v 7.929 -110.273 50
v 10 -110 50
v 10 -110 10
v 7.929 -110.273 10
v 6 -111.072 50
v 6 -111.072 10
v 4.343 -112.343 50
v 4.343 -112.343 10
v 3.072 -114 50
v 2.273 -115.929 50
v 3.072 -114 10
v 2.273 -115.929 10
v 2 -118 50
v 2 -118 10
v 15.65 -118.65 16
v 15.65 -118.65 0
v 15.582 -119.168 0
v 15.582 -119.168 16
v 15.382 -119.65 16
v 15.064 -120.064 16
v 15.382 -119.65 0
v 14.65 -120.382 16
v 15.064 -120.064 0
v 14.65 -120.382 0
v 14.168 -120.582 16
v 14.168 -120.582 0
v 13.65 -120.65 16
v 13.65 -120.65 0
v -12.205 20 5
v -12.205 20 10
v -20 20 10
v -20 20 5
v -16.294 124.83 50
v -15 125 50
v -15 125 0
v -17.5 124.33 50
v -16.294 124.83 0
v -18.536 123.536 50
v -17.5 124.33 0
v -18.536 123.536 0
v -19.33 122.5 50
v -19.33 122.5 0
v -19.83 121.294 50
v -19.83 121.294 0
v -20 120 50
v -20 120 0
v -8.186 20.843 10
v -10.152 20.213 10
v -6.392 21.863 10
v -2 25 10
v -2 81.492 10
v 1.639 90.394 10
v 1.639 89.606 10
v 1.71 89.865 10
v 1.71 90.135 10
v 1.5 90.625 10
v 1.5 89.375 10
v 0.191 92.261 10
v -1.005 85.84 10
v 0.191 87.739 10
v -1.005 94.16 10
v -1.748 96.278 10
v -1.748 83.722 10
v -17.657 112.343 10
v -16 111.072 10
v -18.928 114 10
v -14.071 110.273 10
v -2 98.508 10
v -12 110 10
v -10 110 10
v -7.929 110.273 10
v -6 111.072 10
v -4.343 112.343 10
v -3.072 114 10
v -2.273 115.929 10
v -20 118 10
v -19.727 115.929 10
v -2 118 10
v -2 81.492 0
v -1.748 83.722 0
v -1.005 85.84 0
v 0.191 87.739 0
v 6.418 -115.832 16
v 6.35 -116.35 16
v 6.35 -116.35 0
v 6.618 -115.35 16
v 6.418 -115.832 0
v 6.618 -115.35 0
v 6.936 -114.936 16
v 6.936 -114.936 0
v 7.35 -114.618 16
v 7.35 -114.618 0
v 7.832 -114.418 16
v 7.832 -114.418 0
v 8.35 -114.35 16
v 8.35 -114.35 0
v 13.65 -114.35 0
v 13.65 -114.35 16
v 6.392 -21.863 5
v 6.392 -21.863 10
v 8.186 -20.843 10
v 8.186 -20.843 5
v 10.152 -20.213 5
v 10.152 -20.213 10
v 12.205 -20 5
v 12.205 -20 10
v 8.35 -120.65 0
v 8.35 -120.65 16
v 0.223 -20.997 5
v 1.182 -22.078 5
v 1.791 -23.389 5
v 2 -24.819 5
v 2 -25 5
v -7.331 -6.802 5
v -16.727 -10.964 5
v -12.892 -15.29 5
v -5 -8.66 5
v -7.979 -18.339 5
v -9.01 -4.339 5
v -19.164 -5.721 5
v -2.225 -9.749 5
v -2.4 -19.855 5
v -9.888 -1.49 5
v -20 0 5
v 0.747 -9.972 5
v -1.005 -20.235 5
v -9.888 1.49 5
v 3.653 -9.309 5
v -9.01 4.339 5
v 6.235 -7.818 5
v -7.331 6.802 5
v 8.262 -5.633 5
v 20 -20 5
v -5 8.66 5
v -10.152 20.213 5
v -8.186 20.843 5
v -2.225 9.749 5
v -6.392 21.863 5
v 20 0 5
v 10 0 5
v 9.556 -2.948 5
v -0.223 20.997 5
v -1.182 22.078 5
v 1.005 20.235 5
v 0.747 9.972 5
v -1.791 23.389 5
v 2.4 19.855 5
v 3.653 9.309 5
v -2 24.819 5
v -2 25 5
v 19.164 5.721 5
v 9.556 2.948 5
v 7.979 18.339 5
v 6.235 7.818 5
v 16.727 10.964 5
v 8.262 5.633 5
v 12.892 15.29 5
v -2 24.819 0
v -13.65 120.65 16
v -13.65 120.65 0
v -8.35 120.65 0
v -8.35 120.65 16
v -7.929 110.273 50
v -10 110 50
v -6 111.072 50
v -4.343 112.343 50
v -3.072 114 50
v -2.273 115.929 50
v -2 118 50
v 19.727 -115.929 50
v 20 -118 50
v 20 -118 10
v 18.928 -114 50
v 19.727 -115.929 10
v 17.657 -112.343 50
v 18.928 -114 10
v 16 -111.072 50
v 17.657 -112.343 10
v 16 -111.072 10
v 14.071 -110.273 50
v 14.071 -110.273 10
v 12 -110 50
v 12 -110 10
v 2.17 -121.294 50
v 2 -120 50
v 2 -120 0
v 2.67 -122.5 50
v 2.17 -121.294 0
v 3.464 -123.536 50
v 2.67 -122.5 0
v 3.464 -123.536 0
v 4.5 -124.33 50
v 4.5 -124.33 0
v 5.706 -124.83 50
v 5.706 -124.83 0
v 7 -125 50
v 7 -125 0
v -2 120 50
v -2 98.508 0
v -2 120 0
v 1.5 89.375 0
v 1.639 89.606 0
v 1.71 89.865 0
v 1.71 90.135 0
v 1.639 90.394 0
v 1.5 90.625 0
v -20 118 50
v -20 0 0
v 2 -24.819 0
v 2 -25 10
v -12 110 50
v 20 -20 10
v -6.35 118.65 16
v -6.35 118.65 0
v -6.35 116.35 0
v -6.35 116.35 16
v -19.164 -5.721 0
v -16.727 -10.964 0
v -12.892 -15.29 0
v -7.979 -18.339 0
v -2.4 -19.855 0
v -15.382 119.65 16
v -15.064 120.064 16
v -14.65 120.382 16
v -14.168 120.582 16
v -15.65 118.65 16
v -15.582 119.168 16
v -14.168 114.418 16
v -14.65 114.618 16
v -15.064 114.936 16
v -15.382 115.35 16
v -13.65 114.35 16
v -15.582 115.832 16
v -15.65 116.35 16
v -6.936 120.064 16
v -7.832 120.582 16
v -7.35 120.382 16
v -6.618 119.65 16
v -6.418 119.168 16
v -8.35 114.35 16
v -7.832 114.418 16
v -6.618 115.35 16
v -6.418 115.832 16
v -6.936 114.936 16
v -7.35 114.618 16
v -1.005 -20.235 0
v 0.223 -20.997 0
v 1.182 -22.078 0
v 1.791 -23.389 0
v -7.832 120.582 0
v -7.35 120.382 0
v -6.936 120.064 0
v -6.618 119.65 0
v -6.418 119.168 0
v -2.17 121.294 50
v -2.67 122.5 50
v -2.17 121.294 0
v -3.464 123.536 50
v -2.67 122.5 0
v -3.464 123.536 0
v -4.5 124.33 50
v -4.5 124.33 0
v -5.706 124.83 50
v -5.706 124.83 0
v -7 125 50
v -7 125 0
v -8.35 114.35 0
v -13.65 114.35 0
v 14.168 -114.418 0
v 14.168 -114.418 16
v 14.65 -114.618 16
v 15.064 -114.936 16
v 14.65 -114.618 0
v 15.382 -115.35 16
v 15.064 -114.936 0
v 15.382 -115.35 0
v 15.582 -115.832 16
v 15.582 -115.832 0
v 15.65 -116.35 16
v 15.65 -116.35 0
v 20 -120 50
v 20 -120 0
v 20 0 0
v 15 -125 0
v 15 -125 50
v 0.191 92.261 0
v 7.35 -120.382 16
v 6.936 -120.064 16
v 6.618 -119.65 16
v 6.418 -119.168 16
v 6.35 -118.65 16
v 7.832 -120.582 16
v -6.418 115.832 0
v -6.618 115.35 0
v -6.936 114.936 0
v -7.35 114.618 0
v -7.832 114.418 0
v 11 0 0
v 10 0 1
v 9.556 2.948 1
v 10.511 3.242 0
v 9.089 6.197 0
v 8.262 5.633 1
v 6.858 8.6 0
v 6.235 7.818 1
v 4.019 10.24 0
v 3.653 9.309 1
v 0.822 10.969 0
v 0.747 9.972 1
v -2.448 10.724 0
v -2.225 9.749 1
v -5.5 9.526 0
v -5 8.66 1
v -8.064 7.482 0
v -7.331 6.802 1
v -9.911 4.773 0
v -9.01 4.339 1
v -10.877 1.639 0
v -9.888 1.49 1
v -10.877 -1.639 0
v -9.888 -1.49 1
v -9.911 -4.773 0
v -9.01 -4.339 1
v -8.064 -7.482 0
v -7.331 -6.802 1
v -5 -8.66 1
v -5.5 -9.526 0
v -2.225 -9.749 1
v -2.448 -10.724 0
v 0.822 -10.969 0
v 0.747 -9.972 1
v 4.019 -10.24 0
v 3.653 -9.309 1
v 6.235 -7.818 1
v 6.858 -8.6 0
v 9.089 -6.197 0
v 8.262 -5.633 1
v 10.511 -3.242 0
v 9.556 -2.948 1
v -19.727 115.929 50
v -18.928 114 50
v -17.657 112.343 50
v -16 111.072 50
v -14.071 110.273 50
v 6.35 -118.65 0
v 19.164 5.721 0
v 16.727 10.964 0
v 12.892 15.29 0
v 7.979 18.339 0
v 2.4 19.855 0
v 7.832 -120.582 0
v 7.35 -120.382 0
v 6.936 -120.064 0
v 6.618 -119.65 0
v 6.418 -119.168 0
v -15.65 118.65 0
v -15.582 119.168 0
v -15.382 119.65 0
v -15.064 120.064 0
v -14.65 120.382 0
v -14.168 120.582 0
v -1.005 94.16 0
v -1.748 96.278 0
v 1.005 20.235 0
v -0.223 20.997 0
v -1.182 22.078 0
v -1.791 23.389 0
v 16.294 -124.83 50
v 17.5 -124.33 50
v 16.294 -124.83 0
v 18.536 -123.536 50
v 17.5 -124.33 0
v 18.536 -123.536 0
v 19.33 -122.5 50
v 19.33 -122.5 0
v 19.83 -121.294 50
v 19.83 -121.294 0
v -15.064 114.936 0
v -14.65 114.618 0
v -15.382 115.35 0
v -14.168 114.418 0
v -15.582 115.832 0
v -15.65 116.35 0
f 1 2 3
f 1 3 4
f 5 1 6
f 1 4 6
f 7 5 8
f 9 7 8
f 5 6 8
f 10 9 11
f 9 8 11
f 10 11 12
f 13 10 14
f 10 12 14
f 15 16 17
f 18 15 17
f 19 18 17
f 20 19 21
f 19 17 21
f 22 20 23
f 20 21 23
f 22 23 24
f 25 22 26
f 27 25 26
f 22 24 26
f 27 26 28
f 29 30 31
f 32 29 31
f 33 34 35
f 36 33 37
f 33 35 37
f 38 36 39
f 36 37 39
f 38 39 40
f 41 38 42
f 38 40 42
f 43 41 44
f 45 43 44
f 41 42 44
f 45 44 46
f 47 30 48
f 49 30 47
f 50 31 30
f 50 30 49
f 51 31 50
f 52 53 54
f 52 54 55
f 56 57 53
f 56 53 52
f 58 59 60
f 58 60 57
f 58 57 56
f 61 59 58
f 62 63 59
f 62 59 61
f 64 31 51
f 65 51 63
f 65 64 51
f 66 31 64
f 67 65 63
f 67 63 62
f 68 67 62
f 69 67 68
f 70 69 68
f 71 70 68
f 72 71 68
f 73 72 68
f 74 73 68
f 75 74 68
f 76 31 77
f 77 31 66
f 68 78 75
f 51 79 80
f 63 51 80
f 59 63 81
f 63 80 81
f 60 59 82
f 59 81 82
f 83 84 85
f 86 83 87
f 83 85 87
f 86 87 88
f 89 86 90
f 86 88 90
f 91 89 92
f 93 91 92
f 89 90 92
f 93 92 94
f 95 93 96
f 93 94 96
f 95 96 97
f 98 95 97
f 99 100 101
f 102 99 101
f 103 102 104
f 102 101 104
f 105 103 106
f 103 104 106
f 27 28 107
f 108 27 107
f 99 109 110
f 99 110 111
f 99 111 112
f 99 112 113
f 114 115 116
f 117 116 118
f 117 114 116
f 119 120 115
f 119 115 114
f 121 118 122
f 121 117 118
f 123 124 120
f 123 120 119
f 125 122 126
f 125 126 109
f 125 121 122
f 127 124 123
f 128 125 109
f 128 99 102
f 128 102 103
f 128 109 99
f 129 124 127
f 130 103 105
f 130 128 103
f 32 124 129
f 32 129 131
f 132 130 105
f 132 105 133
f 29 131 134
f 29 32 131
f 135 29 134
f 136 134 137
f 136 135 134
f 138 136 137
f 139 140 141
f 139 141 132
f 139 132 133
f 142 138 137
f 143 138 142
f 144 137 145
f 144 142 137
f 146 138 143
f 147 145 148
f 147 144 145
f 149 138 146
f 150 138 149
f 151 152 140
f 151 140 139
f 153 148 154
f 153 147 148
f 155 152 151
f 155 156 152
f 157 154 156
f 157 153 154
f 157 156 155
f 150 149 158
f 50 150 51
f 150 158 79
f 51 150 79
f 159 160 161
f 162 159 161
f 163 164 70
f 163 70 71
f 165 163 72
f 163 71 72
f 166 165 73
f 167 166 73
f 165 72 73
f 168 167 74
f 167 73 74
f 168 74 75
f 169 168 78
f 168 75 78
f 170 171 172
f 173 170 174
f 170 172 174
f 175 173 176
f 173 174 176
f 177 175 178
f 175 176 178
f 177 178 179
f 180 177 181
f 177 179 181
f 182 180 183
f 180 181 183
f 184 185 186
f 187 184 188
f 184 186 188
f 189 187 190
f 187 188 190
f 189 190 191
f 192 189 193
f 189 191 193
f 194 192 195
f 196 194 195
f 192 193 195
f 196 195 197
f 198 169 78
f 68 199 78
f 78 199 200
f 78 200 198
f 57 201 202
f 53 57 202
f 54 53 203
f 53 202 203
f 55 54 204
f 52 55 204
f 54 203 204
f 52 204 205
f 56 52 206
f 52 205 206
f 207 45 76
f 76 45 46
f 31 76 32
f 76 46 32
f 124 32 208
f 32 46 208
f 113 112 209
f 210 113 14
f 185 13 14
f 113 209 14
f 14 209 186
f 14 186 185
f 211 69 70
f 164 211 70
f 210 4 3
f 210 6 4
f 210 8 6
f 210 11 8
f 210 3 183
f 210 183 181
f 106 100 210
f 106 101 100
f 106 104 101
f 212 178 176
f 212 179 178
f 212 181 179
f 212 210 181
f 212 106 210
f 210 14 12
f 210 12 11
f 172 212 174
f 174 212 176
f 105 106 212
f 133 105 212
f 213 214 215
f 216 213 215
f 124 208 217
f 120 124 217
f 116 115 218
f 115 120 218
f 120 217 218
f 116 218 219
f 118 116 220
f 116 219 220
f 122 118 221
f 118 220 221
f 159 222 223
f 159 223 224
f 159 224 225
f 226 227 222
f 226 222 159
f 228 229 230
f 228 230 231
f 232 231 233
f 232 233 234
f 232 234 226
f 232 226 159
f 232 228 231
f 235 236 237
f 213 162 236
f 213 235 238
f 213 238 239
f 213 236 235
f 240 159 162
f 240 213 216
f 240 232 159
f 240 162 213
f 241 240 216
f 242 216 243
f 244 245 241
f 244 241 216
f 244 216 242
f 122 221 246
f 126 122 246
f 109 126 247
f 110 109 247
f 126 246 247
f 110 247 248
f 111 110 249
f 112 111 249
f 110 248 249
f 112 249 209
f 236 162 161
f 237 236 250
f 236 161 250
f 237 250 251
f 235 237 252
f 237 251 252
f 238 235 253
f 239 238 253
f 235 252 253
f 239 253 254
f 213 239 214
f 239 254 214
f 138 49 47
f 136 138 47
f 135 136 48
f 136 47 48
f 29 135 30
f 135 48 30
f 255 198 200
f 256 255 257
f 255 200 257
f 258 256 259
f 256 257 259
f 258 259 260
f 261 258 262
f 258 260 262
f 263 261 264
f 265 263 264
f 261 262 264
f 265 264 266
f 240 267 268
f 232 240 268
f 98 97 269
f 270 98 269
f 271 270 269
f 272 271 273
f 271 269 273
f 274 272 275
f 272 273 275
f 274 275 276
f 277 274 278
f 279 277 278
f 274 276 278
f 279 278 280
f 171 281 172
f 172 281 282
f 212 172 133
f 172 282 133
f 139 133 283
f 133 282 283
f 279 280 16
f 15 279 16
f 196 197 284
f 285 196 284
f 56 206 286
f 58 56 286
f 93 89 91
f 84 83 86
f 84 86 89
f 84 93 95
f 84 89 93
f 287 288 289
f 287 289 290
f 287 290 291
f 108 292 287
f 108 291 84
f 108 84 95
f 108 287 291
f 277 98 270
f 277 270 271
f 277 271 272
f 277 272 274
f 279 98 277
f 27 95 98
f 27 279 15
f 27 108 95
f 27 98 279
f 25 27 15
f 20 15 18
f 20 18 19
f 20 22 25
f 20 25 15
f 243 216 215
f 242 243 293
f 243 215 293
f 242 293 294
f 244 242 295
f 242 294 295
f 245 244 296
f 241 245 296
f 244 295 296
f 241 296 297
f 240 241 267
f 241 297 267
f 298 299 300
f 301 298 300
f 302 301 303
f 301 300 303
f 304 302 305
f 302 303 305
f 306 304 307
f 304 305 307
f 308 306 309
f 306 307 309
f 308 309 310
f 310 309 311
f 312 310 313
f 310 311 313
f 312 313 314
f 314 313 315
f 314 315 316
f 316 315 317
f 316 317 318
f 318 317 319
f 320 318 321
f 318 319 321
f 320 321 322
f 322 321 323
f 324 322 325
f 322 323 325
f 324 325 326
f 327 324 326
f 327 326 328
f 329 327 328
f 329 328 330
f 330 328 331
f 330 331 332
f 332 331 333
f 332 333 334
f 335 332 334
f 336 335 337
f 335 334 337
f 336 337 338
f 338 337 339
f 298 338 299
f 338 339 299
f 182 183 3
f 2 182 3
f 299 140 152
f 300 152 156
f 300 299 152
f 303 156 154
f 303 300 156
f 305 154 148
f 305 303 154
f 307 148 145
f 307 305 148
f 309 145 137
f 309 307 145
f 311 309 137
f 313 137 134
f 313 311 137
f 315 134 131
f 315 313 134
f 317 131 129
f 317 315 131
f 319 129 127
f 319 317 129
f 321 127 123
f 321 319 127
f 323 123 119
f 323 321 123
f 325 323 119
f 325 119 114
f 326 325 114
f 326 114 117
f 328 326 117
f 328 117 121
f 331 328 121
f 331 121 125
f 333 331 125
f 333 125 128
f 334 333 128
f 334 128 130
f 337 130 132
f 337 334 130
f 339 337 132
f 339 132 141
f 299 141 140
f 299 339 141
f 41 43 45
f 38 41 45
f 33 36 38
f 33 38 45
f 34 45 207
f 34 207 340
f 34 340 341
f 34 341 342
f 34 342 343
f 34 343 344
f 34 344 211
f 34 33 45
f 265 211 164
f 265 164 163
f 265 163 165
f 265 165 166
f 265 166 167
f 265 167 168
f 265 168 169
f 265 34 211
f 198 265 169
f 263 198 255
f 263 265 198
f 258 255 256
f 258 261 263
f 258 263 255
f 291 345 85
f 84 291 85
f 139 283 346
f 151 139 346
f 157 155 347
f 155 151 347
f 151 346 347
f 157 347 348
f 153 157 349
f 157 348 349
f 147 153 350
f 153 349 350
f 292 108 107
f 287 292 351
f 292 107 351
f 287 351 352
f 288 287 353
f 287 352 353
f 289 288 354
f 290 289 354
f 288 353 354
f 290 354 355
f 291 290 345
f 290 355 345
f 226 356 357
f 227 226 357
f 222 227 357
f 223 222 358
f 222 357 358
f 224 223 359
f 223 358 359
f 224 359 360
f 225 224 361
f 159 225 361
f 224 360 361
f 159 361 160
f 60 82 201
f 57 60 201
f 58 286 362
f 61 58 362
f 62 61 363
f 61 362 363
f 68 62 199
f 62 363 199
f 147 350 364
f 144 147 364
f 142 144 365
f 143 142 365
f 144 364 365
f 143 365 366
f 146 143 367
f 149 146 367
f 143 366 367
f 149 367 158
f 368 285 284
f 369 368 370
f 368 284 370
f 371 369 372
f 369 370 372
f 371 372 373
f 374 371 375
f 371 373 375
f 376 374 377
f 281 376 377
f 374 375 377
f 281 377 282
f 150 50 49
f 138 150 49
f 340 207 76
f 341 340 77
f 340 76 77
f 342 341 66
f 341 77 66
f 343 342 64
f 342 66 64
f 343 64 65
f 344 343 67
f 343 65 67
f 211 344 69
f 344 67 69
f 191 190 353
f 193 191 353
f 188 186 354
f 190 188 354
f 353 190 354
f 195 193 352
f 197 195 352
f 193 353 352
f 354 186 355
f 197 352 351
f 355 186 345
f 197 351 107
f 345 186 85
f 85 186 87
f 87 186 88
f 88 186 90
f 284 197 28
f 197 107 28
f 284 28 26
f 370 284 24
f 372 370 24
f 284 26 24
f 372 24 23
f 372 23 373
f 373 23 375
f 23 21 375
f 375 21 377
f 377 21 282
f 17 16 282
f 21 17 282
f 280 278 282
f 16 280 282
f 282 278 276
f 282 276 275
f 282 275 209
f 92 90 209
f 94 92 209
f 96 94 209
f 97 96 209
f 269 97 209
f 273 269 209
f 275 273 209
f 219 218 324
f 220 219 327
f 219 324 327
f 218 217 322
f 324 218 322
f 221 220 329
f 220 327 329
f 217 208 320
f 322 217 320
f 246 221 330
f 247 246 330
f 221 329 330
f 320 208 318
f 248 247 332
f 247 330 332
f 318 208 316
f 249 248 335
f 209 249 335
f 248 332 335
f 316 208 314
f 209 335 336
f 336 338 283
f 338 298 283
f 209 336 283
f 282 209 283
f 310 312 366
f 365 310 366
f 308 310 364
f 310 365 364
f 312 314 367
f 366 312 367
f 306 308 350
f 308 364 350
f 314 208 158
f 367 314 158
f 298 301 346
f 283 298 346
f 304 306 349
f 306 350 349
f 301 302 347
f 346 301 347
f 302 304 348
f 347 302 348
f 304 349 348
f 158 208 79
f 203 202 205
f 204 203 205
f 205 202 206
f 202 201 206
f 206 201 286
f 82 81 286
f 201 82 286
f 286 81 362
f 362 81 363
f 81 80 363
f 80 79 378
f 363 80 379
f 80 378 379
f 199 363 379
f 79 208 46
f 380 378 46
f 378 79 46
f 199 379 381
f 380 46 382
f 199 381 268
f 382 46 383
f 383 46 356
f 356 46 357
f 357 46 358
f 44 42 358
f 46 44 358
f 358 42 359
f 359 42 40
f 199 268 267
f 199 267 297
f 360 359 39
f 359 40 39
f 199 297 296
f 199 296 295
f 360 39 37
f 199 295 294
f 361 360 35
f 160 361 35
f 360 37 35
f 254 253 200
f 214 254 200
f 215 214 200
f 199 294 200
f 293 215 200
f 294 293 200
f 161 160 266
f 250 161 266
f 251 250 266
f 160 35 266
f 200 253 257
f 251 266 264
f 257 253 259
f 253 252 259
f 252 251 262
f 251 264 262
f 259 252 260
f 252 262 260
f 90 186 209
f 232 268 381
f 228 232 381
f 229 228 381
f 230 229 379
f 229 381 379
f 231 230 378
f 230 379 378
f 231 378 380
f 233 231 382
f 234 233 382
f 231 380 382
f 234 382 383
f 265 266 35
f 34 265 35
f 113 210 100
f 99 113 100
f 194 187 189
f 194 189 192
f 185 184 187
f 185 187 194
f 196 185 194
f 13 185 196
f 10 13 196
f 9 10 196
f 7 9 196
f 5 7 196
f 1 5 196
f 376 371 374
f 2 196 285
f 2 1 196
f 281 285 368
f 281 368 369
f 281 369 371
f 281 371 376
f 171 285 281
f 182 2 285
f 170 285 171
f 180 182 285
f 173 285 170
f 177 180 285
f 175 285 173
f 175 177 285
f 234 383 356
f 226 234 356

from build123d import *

# Parameters (mm, degrees)
F0_R     = 10
F1_DEPTH = 10
F3_DEPTH = 5
F5_DEPTH = 40
F6_SIZE  = 1
F8_DEPTH = 16


with BuildPart() as f1:
    # F0 (on Top) → F1 (new body)
    with BuildSketch(Plane.XY):
        with BuildLine():
            Line((-20, 120), (-20, 0))
            ThreePointArc((-20, 0), (-14.96663, -13.266499), (-2.4, -19.855478))
            ThreePointArc((-2.4, -19.855478), (0.741657, -21.502723), (2, -24.819347))
            Line((2, -24.819347), (2, -120))
            ThreePointArc((2, -120), (3.464466, -123.535534), (7, -125))
            Line((7, -125), (15, -125))
            ThreePointArc((15, -125), (18.535534, -123.535534), (20, -120))
            Line((20, -120), (20, 0))
            ThreePointArc((20, 0), (14.96663, 13.266499), (2.4, 19.855478))
            ThreePointArc((2.4, 19.855478), (-0.741657, 21.502723), (-2, 24.819347))
            Line((-2, 24.819347), (-2, 81.492189))
            ThreePointArc((-2, 81.492189), (-1.436283, 84.802259), (0.191312, 87.73914))
            Line((0.191312, 87.73914), (1.500244, 89.375305))
            ThreePointArc((1.500244, 89.375305), (1.719375, 90), (1.500244, 90.624695))
            Line((1.500244, 90.624695), (0.191312, 92.26086))
            ThreePointArc((0.191312, 92.26086), (-1.436283, 95.197741), (-2, 98.507811))
            Line((-2, 98.507811), (-2, 120))
            ThreePointArc((-2, 120), (-3.464466, 123.535534), (-7, 125))
            Line((-7, 125), (-15, 125))
            ThreePointArc((-15, 125), (-18.535534, 123.535534), (-20, 120))
        make_face()
        Circle(F0_R, mode=Mode.SUBTRACT)
    extrude(amount=F1_DEPTH)

    # F2 (on face) → F3 (cut)
    with BuildSketch(Plane.XY.offset(10)):
        with BuildLine():
            Line((12.204651, -20), (20, -20))
            Line((20, -20), (20, 25))
            Line((20, 25), (-2, 25))
            Line((-2, 25), (-6.392269, 21.862665))
            ThreePointArc((-6.392269, 21.862665), (-9.152876, 20.477045), (-12.204651, 20))
            Line((-12.204651, 20), (-20, 20))
            Line((-20, 20), (-20, -25))
            Line((-20, -25), (2, -25))
            Line((2, -25), (6.392269, -21.862665))
            ThreePointArc((6.392269, -21.862665), (9.152876, -20.477045), (12.204651, -20))
        make_face()
    extrude(amount=-F3_DEPTH, mode=Mode.SUBTRACT)

    # F4 (on face) → F5 (join)
    with BuildSketch(Plane.XY.offset(10)):
        with BuildLine():
            Line((-7, 125), (-15, 125))
            ThreePointArc((-15, 125), (-18.535534, 123.535534), (-20, 120))
            Line((-20, 120), (-20, 118))
            ThreePointArc((-20, 118), (-17.656854, 112.343146), (-12, 110))
            Line((-12, 110), (-10, 110))
            ThreePointArc((-10, 110), (-4.343146, 112.343146), (-2, 118))
            Line((-2, 118), (-2, 120))
            ThreePointArc((-2, 120), (-3.464466, 123.535534), (-7, 125))
        make_face()
        with BuildLine():
            Line((7, -125), (15, -125))
            ThreePointArc((15, -125), (18.535534, -123.535534), (20, -120))
            Line((20, -120), (20, -118))
            ThreePointArc((20, -118), (17.656854, -112.343146), (12, -110))
            Line((12, -110), (10, -110))
            ThreePointArc((10, -110), (4.343146, -112.343146), (2, -118))
            Line((2, -118), (2, -120))
            ThreePointArc((2, -120), (3.464466, -123.535534), (7, -125))
        make_face()
    extrude(amount=F5_DEPTH)

    # F6
    f6_edges = [f1.edges().sort_by_distance(p)[0] for p in [
        (-10, 0, 0),
    ]]
    chamfer(f6_edges, length=F6_SIZE)

    # F7 (on face) → F8 (cut)
    with BuildSketch(Plane(origin=(0, 0, 0), x_dir=(1, 0, 0), z_dir=(0, 0, -1))):
        with BuildLine():
            Line((13.65, 120.65), (8.35, 120.65))
            ThreePointArc((8.35, 120.65), (6.935786, 120.064214), (6.35, 118.65))
            Line((6.35, 118.65), (6.35, 116.35))
            ThreePointArc((6.35, 116.35), (6.935786, 114.935786), (8.35, 114.35))
            Line((8.35, 114.35), (13.65, 114.35))
            ThreePointArc((13.65, 114.35), (15.064214, 114.935786), (15.65, 116.35))
            Line((15.65, 116.35), (15.65, 118.65))
            ThreePointArc((15.65, 118.65), (15.064214, 120.064214), (13.65, 120.65))
        make_face()
        with BuildLine():
            Line((-8.35, -114.35), (-13.65, -114.35))
            ThreePointArc((-13.65, -114.35), (-15.064214, -114.935786), (-15.65, -116.35))
            Line((-15.65, -116.35), (-15.65, -118.65))
            ThreePointArc((-15.65, -118.65), (-15.064214, -120.064214), (-13.65, -120.65))
            Line((-13.65, -120.65), (-8.35, -120.65))
            ThreePointArc((-8.35, -120.65), (-6.935786, -120.064214), (-6.35, -118.65))
            Line((-6.35, -118.65), (-6.35, -116.35))
            ThreePointArc((-6.35, -116.35), (-6.935786, -114.935786), (-8.35, -114.35))
        make_face()
    extrude(amount=-F8_DEPTH, mode=Mode.SUBTRACT)


solid = f1.part
